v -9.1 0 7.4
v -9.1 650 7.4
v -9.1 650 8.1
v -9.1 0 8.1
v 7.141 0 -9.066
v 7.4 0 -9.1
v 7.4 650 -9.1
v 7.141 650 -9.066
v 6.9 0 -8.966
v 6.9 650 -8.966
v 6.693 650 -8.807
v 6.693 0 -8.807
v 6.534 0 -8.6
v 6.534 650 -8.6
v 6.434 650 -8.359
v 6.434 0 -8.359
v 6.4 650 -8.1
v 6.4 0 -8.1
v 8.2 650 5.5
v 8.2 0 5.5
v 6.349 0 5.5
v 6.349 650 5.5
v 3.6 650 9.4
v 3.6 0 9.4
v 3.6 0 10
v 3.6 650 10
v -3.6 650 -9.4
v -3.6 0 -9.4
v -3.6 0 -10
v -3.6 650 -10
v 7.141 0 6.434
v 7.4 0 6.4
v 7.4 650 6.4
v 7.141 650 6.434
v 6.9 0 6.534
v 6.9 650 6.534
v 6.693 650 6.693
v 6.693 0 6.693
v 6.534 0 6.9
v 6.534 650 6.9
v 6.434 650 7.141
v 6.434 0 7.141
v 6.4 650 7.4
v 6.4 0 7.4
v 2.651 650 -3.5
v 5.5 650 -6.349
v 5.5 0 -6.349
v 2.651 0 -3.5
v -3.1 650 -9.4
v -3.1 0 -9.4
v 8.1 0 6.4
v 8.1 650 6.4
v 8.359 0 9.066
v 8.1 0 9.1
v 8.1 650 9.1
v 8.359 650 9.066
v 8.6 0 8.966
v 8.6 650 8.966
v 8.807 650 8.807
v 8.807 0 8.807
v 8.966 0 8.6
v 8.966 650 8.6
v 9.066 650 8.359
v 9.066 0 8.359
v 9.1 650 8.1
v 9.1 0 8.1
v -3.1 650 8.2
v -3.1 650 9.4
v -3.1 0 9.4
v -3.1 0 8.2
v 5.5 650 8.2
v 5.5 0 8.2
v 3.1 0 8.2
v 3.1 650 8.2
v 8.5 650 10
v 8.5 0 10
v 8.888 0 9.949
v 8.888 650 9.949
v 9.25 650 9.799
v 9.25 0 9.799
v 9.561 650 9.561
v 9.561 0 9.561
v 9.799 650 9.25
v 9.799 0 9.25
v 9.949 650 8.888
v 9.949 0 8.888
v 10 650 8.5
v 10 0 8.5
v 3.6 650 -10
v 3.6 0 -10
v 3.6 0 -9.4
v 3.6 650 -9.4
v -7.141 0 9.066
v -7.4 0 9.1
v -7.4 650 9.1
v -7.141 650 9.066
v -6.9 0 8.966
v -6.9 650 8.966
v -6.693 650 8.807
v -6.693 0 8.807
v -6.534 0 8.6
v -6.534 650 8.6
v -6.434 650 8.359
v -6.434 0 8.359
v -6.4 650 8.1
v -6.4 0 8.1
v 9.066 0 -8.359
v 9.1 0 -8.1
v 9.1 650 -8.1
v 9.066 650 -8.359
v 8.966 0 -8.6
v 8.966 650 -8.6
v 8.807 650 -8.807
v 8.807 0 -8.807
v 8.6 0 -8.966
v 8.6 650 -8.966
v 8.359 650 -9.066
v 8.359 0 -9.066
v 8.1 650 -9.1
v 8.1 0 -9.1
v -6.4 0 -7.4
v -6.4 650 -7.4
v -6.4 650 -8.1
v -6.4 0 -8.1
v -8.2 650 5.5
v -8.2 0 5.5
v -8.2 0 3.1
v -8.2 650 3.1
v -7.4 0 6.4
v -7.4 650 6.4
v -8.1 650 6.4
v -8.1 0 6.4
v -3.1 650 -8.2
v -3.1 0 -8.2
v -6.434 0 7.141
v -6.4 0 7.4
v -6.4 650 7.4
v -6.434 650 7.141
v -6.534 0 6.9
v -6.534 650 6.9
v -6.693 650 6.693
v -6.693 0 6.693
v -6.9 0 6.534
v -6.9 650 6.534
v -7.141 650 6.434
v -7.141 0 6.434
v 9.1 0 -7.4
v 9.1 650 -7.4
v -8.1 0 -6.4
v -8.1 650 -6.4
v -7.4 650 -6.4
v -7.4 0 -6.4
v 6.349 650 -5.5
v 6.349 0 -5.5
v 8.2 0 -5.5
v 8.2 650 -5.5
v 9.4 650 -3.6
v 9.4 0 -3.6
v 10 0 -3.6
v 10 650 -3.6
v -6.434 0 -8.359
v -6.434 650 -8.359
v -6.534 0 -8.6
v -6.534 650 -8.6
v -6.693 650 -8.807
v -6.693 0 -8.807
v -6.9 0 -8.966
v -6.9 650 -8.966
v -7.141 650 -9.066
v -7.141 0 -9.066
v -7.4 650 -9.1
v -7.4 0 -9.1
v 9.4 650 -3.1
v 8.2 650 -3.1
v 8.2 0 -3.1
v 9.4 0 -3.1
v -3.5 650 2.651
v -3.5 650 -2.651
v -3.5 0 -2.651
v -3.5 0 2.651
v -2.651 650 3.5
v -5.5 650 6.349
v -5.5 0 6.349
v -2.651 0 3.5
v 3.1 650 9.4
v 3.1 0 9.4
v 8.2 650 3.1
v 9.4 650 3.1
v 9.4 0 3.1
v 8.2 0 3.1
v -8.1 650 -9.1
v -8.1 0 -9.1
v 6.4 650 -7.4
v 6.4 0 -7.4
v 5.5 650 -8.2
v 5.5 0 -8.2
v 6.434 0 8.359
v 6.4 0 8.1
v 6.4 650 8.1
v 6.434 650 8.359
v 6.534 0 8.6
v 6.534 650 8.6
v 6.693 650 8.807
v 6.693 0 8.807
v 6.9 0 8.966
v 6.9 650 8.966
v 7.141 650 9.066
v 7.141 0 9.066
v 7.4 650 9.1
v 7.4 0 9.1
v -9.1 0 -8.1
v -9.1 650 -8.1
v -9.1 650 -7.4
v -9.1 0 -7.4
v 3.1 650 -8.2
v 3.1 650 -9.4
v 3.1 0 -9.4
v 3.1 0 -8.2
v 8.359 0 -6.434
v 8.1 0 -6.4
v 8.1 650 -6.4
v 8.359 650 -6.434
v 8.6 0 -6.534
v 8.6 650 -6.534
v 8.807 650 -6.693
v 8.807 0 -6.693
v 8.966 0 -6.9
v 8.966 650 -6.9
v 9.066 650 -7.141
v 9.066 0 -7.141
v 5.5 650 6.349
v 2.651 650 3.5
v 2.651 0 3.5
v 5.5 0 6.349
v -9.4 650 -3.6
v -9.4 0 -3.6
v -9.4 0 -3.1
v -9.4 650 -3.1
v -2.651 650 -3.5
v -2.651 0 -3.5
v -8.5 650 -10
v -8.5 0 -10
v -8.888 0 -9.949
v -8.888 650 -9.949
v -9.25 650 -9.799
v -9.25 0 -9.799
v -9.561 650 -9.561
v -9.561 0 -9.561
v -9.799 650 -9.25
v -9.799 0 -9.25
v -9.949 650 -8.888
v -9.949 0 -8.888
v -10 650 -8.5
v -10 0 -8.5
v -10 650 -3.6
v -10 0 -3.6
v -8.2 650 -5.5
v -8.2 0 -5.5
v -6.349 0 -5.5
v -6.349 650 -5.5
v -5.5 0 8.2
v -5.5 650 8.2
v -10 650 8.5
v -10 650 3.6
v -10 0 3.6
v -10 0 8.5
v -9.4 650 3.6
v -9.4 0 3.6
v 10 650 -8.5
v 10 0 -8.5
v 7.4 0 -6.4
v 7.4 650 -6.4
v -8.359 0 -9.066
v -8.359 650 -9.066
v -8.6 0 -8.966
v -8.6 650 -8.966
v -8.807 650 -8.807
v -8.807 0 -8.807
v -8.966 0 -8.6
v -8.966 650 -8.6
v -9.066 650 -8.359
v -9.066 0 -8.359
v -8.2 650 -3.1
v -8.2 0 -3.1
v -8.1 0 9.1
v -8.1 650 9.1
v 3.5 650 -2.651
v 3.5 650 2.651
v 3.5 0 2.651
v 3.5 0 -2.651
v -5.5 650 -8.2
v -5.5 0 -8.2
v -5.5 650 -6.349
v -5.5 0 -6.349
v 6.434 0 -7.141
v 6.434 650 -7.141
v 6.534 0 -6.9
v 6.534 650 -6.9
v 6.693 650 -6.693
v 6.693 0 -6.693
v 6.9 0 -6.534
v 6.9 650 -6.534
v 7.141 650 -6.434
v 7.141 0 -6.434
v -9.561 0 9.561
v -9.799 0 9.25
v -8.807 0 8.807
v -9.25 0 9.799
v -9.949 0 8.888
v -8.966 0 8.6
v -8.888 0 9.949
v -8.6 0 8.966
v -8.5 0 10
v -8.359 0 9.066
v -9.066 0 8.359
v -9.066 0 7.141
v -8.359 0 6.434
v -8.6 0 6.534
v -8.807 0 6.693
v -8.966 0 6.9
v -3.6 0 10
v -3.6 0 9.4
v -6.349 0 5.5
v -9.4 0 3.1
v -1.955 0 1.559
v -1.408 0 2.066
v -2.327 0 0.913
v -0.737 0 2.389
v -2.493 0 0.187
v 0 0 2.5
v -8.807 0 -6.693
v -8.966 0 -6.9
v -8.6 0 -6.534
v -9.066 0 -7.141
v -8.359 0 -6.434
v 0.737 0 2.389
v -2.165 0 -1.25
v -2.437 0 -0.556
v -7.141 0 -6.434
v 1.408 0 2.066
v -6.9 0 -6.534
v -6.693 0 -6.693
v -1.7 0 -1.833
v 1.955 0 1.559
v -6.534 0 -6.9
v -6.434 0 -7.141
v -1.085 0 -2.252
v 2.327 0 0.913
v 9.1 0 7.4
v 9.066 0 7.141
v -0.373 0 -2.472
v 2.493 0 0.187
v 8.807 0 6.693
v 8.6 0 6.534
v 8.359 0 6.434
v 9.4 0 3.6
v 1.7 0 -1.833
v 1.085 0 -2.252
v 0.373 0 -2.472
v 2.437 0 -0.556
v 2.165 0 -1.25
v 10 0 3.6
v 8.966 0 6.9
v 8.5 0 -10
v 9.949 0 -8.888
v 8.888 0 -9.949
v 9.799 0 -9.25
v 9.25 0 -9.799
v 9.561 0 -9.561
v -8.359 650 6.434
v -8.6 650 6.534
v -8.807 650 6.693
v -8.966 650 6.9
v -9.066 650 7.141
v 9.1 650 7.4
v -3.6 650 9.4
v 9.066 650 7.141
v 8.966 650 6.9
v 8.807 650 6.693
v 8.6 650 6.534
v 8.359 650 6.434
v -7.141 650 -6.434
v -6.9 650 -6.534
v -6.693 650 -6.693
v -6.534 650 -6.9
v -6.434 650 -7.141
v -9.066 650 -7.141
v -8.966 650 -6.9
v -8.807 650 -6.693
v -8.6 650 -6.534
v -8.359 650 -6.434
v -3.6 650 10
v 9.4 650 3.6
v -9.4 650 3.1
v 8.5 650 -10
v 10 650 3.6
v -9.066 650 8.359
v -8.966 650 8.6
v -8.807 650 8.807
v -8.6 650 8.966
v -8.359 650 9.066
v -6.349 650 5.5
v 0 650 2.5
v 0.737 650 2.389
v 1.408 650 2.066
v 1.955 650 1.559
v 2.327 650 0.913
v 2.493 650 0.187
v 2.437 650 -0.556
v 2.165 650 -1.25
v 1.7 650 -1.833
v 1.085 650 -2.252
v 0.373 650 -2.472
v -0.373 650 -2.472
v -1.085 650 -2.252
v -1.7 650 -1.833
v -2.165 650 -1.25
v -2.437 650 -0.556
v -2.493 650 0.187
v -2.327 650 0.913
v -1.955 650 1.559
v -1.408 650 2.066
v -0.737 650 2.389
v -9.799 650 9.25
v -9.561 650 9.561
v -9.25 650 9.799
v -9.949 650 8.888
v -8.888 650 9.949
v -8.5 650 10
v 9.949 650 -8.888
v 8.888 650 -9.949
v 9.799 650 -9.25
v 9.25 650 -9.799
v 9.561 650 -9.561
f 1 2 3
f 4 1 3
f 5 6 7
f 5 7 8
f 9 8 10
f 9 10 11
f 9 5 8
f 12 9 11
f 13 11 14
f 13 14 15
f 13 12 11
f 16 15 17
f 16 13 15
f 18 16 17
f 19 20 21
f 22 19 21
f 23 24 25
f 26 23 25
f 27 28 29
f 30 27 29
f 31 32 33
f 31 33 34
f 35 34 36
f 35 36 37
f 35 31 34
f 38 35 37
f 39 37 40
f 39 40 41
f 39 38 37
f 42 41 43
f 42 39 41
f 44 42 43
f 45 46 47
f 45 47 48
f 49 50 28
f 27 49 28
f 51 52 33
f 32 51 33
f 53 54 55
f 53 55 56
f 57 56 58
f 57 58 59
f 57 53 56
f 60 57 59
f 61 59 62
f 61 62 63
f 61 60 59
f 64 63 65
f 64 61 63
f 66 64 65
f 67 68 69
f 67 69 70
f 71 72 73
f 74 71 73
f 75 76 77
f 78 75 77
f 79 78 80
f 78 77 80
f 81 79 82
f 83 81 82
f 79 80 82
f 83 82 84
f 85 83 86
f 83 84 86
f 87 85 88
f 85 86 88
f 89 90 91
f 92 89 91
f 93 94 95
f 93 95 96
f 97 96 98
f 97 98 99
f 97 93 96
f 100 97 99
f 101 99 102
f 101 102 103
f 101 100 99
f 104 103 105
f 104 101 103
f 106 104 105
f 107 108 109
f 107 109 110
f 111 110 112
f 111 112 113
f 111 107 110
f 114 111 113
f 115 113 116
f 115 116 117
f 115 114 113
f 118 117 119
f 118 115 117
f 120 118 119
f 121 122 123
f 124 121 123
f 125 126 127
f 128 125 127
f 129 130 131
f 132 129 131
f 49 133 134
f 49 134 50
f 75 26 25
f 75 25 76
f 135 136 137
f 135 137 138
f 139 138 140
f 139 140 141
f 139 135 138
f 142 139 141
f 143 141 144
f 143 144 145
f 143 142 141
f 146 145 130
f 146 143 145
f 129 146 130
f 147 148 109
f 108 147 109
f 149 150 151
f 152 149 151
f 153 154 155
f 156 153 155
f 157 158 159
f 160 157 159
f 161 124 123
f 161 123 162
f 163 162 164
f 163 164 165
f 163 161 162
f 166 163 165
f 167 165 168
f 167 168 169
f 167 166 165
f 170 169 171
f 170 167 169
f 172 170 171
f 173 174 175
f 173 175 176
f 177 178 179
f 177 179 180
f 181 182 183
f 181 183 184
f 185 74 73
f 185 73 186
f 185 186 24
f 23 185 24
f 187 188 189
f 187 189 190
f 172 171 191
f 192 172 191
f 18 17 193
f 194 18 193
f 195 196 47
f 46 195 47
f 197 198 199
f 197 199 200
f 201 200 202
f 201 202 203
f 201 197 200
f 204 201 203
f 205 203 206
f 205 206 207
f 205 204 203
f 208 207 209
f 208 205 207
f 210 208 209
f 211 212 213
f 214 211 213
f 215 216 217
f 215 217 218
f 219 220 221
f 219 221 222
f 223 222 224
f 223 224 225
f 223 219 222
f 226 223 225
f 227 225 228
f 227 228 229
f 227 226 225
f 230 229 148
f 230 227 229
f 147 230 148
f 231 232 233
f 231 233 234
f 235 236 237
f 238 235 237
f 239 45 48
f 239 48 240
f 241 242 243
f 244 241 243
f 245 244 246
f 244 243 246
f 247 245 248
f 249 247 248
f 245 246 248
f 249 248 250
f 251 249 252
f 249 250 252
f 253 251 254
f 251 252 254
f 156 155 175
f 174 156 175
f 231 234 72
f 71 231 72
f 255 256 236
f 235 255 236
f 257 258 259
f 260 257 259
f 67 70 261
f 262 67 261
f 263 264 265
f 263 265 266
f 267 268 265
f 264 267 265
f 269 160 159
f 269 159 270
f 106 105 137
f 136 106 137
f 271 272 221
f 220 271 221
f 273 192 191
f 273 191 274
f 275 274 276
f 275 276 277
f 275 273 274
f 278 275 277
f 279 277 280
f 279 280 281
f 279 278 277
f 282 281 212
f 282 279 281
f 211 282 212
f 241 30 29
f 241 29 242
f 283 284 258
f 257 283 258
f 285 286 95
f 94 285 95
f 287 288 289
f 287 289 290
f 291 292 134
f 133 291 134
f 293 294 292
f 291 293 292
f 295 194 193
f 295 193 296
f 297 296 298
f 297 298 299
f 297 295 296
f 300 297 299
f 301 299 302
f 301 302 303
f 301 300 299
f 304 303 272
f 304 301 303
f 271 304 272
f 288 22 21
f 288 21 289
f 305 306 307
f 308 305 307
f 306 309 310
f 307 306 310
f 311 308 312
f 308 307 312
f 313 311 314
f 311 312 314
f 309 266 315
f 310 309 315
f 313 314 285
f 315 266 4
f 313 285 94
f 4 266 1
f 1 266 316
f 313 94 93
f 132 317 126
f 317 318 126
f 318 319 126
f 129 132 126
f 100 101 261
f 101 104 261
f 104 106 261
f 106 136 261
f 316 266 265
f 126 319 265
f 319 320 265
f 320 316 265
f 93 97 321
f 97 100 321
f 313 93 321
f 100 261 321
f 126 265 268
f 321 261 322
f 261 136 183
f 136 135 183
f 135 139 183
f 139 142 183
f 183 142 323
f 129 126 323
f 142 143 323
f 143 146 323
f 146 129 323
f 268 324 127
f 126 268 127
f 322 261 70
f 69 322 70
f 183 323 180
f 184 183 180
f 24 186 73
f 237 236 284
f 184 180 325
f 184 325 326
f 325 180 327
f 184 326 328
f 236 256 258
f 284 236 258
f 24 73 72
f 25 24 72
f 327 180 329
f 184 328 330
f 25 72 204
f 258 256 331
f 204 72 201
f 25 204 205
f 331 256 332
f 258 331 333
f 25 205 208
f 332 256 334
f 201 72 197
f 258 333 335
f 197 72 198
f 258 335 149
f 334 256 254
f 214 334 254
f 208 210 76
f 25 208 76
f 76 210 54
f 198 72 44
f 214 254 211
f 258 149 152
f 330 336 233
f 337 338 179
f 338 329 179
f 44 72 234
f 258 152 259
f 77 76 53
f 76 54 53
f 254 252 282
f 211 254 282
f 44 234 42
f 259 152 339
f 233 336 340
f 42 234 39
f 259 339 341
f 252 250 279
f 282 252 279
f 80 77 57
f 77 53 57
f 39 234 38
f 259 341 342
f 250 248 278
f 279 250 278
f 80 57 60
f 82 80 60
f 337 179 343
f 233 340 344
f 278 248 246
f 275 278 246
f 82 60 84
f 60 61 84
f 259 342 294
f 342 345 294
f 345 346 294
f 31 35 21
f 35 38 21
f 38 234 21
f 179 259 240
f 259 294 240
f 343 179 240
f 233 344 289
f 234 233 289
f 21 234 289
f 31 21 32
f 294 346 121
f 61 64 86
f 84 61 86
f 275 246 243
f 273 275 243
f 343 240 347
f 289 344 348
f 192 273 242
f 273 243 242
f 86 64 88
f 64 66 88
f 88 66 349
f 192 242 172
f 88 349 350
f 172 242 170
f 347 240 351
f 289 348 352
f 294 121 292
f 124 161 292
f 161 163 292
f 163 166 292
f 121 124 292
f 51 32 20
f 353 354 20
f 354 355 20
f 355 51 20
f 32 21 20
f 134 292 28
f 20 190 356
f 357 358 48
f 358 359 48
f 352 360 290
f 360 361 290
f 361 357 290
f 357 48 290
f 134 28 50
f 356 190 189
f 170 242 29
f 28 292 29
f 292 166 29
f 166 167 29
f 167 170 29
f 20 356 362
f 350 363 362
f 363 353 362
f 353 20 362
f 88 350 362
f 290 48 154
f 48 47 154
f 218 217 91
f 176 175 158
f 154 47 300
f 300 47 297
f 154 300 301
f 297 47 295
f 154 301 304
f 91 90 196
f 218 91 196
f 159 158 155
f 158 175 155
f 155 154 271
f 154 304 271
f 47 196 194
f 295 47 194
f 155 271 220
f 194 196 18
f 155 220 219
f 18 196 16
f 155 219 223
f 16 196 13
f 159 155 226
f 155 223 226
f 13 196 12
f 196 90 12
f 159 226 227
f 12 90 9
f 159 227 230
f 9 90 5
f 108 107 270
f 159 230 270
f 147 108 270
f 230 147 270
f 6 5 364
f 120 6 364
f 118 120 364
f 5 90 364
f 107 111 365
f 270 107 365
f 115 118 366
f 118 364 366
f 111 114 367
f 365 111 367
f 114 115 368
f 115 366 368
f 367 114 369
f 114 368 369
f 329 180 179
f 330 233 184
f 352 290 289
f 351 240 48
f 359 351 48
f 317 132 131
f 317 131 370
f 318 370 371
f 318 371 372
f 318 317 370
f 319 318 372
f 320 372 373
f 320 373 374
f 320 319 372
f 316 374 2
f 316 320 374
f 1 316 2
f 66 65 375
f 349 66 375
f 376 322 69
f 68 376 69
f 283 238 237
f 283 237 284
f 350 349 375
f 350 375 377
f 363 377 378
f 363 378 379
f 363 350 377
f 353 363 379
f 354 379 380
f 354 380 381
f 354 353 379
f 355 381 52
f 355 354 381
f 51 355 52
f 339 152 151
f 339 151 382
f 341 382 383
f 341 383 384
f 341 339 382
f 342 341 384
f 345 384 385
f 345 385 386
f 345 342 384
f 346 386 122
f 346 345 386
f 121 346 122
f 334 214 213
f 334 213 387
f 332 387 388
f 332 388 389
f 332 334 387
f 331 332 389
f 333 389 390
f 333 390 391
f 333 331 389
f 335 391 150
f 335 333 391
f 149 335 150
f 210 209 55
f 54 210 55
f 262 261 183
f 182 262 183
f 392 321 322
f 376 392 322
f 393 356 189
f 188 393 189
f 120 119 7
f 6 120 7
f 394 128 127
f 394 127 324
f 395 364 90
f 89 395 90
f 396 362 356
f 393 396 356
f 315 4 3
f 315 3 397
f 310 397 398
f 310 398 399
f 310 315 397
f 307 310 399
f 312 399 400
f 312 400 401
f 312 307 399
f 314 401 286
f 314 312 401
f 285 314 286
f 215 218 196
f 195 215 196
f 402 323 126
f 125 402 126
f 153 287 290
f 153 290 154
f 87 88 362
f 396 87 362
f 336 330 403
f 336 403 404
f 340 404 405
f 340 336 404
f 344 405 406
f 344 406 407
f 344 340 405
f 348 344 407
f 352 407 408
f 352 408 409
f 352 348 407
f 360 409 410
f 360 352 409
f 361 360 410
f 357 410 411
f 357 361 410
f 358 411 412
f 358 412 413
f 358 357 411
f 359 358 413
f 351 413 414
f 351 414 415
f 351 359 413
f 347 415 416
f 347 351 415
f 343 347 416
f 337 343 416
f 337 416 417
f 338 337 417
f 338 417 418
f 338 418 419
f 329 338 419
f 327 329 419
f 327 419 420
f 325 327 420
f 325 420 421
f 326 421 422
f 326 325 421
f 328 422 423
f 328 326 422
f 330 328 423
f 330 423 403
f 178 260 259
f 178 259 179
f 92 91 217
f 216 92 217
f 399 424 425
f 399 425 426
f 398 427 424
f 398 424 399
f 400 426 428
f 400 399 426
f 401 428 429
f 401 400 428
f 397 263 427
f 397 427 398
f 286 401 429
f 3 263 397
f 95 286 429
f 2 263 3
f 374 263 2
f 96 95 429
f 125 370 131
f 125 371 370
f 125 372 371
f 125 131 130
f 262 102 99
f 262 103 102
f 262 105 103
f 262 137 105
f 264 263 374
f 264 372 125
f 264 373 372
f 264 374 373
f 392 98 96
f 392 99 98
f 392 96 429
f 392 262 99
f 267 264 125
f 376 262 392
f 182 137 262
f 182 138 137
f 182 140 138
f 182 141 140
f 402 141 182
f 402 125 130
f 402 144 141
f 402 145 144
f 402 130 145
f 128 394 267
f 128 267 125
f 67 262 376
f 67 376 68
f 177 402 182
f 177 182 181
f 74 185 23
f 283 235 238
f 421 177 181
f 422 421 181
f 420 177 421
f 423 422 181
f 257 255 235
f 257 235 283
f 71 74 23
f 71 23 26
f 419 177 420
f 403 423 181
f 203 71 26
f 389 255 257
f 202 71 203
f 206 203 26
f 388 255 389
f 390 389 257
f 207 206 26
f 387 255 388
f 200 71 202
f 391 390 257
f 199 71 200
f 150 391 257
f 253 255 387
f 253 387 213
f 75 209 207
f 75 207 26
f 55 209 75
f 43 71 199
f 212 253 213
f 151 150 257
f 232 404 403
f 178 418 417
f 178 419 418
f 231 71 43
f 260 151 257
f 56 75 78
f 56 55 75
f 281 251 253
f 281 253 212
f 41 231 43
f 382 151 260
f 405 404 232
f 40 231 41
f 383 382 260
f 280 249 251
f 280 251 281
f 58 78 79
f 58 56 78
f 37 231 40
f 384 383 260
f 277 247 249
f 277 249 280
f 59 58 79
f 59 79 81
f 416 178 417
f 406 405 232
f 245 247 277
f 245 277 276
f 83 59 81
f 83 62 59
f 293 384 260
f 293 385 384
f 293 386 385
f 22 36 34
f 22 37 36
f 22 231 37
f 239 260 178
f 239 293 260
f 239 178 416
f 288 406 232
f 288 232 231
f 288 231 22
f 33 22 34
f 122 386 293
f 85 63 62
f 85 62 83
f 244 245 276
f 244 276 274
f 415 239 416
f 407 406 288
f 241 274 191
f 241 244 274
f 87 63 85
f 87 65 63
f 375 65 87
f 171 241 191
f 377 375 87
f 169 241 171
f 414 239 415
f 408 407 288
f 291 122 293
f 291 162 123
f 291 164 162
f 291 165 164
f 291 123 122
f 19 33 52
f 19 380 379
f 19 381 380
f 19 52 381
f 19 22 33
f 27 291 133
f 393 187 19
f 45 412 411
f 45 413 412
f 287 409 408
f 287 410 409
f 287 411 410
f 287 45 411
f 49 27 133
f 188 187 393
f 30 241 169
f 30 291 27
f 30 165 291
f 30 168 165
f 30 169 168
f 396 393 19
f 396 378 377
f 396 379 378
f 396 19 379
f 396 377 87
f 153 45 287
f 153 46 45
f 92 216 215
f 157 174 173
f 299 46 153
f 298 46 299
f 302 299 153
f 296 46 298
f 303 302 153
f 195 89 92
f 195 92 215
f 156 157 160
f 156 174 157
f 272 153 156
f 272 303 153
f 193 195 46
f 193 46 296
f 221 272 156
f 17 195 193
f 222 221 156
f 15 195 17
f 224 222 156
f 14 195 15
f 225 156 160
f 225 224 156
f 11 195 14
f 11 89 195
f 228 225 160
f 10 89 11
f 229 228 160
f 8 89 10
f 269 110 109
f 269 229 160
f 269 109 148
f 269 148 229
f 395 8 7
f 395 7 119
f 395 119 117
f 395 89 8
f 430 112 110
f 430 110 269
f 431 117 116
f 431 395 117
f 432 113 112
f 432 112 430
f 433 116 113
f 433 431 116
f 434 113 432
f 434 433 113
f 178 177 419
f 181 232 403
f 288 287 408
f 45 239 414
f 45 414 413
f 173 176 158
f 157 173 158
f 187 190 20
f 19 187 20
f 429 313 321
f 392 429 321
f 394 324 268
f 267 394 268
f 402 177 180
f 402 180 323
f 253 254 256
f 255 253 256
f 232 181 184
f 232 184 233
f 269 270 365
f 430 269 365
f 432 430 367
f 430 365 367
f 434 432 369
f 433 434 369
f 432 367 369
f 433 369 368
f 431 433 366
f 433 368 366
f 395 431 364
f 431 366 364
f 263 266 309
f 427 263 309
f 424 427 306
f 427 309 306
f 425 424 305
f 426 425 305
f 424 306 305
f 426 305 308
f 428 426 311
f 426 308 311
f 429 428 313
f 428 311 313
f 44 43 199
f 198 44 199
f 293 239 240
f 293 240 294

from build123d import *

# Parameters (mm, degrees)
SKETCH_1_R      = 2.5
EXTRUDE_1_DEPTH = 650


with BuildPart() as part:
    # 草图1 → 凸台-拉伸1 (new body)
    with BuildSketch(Plane(origin=(0, 0, 0), x_dir=(1, 0, 0), z_dir=(0, 1, 0))):
        with BuildLine():
            Line((-3.6, 10), (-8.5, 10))
            ThreePointArc((-8.5, 10), (-9.560660172, 9.560660172), (-10, 8.5))
            Line((-10, 8.5), (-10, 3.6))
            Line((-10, 3.6), (-9.4, 3.6))
            Line((-9.4, 3.6), (-9.4, 3.1))
            Line((-9.4, 3.1), (-8.2, 3.1))
            Line((-8.2, 3.1), (-8.2, 5.5))
            Line((-8.2, 5.5), (-6.348528137, 5.5))
            Line((-6.348528137, 5.5), (-3.5, 2.651471863))
            Line((-3.5, 2.651471863), (-3.5, -2.651471863))
            Line((-3.5, -2.651471863), (-6.348528137, -5.5))
            Line((-6.348528137, -5.5), (-8.2, -5.5))
            Line((-8.2, -5.5), (-8.2, -3.1))
            Line((-8.2, -3.1), (-9.4, -3.1))
            Line((-9.4, -3.1), (-9.4, -3.6))
            Line((-9.4, -3.6), (-10, -3.6))
            Line((-10, -3.6), (-10, -8.5))
            ThreePointArc((-10, -8.5), (-9.560660172, -9.560660172), (-8.5, -10))
            Line((-8.5, -10), (-3.6, -10))
            Line((-3.6, -10), (-3.6, -9.4))
            Line((-3.6, -9.4), (-3.1, -9.4))
            Line((-3.1, -9.4), (-3.1, -8.2))
            Line((-3.1, -8.2), (-5.5, -8.2))
            Line((-5.5, -8.2), (-5.5, -6.348528137))
            Line((-5.5, -6.348528137), (-2.651471863, -3.5))
            Line((-2.651471863, -3.5), (2.651471863, -3.5))
            Line((2.651471863, -3.5), (5.5, -6.348528137))
            Line((5.5, -6.348528137), (5.5, -8.2))
            Line((5.5, -8.2), (3.1, -8.2))
            Line((3.1, -8.2), (3.1, -9.4))
            Line((3.1, -9.4), (3.6, -9.4))
            Line((3.6, -9.4), (3.6, -10))
            Line((3.6, -10), (8.5, -10))
            ThreePointArc((8.5, -10), (9.560660172, -9.560660172), (10, -8.5))
            Line((10, -8.5), (10, -3.6))
            Line((10, -3.6), (9.4, -3.6))
            Line((9.4, -3.6), (9.4, -3.1))
            Line((9.4, -3.1), (8.2, -3.1))
            Line((8.2, -3.1), (8.2, -5.5))
            Line((8.2, -5.5), (6.348528137, -5.5))
            Line((6.348528137, -5.5), (3.5, -2.651471863))
            Line((3.5, -2.651471863), (3.5, 2.651471863))
            Line((3.5, 2.651471863), (6.348528137, 5.5))
            Line((6.348528137, 5.5), (8.2, 5.5))
            Line((8.2, 5.5), (8.2, 3.1))
            Line((8.2, 3.1), (9.4, 3.1))
            Line((9.4, 3.1), (9.4, 3.6))
            Line((9.4, 3.6), (10, 3.6))
            Line((10, 3.6), (10, 8.5))
            ThreePointArc((10, 8.5), (9.560660172, 9.560660172), (8.5, 10))
            Line((8.5, 10), (3.6, 10))
            Line((3.6, 10), (3.6, 9.4))
            Line((3.6, 9.4), (3.1, 9.4))
            Line((3.1, 9.4), (3.1, 8.2))
            Line((3.1, 8.2), (5.5, 8.2))
            Line((5.5, 8.2), (5.5, 6.348528137))
            Line((5.5, 6.348528137), (2.651471863, 3.5))
            Line((2.651471863, 3.5), (-2.651471863, 3.5))
            Line((-2.651471863, 3.5), (-5.5, 6.348528137))
            Line((-5.5, 6.348528137), (-5.5, 8.2))
            Line((-5.5, 8.2), (-3.1, 8.2))
            Line((-3.1, 8.2), (-3.1, 9.4))
            Line((-3.1, 9.4), (-3.6, 9.4))
            Line((-3.6, 9.4), (-3.6, 10))
        make_face()
        with Locations(Location((0, 0, 0), (0, 0, 270))):
            Circle(SKETCH_1_R, mode=Mode.SUBTRACT)
        with BuildLine():
            Line((-7.4, 9.1), (-8.1, 9.1))
            ThreePointArc((-8.1, 9.1), (-8.807106781, 8.807106781), (-9.1, 8.1))
            Line((-9.1, 8.1), (-9.1, 7.4))
            ThreePointArc((-9.1, 7.4), (-8.807106781, 6.692893219), (-8.1, 6.4))
            Line((-8.1, 6.4), (-7.4, 6.4))
            ThreePointArc((-7.4, 6.4), (-6.692893219, 6.692893219), (-6.4, 7.4))
            Line((-6.4, 7.4), (-6.4, 8.1))
            ThreePointArc((-6.4, 8.1), (-6.692893219, 8.807106781), (-7.4, 9.1))
        make_face(mode=Mode.SUBTRACT)
        with BuildLine():
            Line((9.1, 7.4), (9.1, 8.1))
            ThreePointArc((9.1, 8.1), (8.807106781, 8.807106781), (8.1, 9.1))
            Line((8.1, 9.1), (7.4, 9.1))
            ThreePointArc((7.4, 9.1), (6.692893219, 8.807106781), (6.4, 8.1))
            Line((6.4, 8.1), (6.4, 7.4))
            ThreePointArc((6.4, 7.4), (6.692893219, 6.692893219), (7.4, 6.4))
            Line((7.4, 6.4), (8.1, 6.4))
            ThreePointArc((8.1, 6.4), (8.807106781, 6.692893219), (9.1, 7.4))
        make_face(mode=Mode.SUBTRACT)
        with BuildLine():
            Line((7.4, -9.1), (8.1, -9.1))
            ThreePointArc((8.1, -9.1), (8.807106781, -8.807106781), (9.1, -8.1))
            Line((9.1, -8.1), (9.1, -7.4))
            ThreePointArc((9.1, -7.4), (8.807106781, -6.692893219), (8.1, -6.4))
            Line((8.1, -6.4), (7.4, -6.4))
            ThreePointArc((7.4, -6.4), (6.692893219, -6.692893219), (6.4, -7.4))
            Line((6.4, -7.4), (6.4, -8.1))
            ThreePointArc((6.4, -8.1), (6.692893219, -8.807106781), (7.4, -9.1))
        make_face(mode=Mode.SUBTRACT)
        with BuildLine():
            Line((-9.1, -7.4), (-9.1, -8.1))
            ThreePointArc((-9.1, -8.1), (-8.807106781, -8.807106781), (-8.1, -9.1))
            Line((-8.1, -9.1), (-7.4, -9.1))
            ThreePointArc((-7.4, -9.1), (-6.692893219, -8.807106781), (-6.4, -8.1))
            Line((-6.4, -8.1), (-6.4, -7.4))
            ThreePointArc((-6.4, -7.4), (-6.692893219, -6.692893219), (-7.4, -6.4))
            Line((-7.4, -6.4), (-8.1, -6.4))
            ThreePointArc((-8.1, -6.4), (-8.807106781, -6.692893219), (-9.1, -7.4))
        make_face(mode=Mode.SUBTRACT)
    extrude(amount=EXTRUDE_1_DEPTH)


solid = part.part
